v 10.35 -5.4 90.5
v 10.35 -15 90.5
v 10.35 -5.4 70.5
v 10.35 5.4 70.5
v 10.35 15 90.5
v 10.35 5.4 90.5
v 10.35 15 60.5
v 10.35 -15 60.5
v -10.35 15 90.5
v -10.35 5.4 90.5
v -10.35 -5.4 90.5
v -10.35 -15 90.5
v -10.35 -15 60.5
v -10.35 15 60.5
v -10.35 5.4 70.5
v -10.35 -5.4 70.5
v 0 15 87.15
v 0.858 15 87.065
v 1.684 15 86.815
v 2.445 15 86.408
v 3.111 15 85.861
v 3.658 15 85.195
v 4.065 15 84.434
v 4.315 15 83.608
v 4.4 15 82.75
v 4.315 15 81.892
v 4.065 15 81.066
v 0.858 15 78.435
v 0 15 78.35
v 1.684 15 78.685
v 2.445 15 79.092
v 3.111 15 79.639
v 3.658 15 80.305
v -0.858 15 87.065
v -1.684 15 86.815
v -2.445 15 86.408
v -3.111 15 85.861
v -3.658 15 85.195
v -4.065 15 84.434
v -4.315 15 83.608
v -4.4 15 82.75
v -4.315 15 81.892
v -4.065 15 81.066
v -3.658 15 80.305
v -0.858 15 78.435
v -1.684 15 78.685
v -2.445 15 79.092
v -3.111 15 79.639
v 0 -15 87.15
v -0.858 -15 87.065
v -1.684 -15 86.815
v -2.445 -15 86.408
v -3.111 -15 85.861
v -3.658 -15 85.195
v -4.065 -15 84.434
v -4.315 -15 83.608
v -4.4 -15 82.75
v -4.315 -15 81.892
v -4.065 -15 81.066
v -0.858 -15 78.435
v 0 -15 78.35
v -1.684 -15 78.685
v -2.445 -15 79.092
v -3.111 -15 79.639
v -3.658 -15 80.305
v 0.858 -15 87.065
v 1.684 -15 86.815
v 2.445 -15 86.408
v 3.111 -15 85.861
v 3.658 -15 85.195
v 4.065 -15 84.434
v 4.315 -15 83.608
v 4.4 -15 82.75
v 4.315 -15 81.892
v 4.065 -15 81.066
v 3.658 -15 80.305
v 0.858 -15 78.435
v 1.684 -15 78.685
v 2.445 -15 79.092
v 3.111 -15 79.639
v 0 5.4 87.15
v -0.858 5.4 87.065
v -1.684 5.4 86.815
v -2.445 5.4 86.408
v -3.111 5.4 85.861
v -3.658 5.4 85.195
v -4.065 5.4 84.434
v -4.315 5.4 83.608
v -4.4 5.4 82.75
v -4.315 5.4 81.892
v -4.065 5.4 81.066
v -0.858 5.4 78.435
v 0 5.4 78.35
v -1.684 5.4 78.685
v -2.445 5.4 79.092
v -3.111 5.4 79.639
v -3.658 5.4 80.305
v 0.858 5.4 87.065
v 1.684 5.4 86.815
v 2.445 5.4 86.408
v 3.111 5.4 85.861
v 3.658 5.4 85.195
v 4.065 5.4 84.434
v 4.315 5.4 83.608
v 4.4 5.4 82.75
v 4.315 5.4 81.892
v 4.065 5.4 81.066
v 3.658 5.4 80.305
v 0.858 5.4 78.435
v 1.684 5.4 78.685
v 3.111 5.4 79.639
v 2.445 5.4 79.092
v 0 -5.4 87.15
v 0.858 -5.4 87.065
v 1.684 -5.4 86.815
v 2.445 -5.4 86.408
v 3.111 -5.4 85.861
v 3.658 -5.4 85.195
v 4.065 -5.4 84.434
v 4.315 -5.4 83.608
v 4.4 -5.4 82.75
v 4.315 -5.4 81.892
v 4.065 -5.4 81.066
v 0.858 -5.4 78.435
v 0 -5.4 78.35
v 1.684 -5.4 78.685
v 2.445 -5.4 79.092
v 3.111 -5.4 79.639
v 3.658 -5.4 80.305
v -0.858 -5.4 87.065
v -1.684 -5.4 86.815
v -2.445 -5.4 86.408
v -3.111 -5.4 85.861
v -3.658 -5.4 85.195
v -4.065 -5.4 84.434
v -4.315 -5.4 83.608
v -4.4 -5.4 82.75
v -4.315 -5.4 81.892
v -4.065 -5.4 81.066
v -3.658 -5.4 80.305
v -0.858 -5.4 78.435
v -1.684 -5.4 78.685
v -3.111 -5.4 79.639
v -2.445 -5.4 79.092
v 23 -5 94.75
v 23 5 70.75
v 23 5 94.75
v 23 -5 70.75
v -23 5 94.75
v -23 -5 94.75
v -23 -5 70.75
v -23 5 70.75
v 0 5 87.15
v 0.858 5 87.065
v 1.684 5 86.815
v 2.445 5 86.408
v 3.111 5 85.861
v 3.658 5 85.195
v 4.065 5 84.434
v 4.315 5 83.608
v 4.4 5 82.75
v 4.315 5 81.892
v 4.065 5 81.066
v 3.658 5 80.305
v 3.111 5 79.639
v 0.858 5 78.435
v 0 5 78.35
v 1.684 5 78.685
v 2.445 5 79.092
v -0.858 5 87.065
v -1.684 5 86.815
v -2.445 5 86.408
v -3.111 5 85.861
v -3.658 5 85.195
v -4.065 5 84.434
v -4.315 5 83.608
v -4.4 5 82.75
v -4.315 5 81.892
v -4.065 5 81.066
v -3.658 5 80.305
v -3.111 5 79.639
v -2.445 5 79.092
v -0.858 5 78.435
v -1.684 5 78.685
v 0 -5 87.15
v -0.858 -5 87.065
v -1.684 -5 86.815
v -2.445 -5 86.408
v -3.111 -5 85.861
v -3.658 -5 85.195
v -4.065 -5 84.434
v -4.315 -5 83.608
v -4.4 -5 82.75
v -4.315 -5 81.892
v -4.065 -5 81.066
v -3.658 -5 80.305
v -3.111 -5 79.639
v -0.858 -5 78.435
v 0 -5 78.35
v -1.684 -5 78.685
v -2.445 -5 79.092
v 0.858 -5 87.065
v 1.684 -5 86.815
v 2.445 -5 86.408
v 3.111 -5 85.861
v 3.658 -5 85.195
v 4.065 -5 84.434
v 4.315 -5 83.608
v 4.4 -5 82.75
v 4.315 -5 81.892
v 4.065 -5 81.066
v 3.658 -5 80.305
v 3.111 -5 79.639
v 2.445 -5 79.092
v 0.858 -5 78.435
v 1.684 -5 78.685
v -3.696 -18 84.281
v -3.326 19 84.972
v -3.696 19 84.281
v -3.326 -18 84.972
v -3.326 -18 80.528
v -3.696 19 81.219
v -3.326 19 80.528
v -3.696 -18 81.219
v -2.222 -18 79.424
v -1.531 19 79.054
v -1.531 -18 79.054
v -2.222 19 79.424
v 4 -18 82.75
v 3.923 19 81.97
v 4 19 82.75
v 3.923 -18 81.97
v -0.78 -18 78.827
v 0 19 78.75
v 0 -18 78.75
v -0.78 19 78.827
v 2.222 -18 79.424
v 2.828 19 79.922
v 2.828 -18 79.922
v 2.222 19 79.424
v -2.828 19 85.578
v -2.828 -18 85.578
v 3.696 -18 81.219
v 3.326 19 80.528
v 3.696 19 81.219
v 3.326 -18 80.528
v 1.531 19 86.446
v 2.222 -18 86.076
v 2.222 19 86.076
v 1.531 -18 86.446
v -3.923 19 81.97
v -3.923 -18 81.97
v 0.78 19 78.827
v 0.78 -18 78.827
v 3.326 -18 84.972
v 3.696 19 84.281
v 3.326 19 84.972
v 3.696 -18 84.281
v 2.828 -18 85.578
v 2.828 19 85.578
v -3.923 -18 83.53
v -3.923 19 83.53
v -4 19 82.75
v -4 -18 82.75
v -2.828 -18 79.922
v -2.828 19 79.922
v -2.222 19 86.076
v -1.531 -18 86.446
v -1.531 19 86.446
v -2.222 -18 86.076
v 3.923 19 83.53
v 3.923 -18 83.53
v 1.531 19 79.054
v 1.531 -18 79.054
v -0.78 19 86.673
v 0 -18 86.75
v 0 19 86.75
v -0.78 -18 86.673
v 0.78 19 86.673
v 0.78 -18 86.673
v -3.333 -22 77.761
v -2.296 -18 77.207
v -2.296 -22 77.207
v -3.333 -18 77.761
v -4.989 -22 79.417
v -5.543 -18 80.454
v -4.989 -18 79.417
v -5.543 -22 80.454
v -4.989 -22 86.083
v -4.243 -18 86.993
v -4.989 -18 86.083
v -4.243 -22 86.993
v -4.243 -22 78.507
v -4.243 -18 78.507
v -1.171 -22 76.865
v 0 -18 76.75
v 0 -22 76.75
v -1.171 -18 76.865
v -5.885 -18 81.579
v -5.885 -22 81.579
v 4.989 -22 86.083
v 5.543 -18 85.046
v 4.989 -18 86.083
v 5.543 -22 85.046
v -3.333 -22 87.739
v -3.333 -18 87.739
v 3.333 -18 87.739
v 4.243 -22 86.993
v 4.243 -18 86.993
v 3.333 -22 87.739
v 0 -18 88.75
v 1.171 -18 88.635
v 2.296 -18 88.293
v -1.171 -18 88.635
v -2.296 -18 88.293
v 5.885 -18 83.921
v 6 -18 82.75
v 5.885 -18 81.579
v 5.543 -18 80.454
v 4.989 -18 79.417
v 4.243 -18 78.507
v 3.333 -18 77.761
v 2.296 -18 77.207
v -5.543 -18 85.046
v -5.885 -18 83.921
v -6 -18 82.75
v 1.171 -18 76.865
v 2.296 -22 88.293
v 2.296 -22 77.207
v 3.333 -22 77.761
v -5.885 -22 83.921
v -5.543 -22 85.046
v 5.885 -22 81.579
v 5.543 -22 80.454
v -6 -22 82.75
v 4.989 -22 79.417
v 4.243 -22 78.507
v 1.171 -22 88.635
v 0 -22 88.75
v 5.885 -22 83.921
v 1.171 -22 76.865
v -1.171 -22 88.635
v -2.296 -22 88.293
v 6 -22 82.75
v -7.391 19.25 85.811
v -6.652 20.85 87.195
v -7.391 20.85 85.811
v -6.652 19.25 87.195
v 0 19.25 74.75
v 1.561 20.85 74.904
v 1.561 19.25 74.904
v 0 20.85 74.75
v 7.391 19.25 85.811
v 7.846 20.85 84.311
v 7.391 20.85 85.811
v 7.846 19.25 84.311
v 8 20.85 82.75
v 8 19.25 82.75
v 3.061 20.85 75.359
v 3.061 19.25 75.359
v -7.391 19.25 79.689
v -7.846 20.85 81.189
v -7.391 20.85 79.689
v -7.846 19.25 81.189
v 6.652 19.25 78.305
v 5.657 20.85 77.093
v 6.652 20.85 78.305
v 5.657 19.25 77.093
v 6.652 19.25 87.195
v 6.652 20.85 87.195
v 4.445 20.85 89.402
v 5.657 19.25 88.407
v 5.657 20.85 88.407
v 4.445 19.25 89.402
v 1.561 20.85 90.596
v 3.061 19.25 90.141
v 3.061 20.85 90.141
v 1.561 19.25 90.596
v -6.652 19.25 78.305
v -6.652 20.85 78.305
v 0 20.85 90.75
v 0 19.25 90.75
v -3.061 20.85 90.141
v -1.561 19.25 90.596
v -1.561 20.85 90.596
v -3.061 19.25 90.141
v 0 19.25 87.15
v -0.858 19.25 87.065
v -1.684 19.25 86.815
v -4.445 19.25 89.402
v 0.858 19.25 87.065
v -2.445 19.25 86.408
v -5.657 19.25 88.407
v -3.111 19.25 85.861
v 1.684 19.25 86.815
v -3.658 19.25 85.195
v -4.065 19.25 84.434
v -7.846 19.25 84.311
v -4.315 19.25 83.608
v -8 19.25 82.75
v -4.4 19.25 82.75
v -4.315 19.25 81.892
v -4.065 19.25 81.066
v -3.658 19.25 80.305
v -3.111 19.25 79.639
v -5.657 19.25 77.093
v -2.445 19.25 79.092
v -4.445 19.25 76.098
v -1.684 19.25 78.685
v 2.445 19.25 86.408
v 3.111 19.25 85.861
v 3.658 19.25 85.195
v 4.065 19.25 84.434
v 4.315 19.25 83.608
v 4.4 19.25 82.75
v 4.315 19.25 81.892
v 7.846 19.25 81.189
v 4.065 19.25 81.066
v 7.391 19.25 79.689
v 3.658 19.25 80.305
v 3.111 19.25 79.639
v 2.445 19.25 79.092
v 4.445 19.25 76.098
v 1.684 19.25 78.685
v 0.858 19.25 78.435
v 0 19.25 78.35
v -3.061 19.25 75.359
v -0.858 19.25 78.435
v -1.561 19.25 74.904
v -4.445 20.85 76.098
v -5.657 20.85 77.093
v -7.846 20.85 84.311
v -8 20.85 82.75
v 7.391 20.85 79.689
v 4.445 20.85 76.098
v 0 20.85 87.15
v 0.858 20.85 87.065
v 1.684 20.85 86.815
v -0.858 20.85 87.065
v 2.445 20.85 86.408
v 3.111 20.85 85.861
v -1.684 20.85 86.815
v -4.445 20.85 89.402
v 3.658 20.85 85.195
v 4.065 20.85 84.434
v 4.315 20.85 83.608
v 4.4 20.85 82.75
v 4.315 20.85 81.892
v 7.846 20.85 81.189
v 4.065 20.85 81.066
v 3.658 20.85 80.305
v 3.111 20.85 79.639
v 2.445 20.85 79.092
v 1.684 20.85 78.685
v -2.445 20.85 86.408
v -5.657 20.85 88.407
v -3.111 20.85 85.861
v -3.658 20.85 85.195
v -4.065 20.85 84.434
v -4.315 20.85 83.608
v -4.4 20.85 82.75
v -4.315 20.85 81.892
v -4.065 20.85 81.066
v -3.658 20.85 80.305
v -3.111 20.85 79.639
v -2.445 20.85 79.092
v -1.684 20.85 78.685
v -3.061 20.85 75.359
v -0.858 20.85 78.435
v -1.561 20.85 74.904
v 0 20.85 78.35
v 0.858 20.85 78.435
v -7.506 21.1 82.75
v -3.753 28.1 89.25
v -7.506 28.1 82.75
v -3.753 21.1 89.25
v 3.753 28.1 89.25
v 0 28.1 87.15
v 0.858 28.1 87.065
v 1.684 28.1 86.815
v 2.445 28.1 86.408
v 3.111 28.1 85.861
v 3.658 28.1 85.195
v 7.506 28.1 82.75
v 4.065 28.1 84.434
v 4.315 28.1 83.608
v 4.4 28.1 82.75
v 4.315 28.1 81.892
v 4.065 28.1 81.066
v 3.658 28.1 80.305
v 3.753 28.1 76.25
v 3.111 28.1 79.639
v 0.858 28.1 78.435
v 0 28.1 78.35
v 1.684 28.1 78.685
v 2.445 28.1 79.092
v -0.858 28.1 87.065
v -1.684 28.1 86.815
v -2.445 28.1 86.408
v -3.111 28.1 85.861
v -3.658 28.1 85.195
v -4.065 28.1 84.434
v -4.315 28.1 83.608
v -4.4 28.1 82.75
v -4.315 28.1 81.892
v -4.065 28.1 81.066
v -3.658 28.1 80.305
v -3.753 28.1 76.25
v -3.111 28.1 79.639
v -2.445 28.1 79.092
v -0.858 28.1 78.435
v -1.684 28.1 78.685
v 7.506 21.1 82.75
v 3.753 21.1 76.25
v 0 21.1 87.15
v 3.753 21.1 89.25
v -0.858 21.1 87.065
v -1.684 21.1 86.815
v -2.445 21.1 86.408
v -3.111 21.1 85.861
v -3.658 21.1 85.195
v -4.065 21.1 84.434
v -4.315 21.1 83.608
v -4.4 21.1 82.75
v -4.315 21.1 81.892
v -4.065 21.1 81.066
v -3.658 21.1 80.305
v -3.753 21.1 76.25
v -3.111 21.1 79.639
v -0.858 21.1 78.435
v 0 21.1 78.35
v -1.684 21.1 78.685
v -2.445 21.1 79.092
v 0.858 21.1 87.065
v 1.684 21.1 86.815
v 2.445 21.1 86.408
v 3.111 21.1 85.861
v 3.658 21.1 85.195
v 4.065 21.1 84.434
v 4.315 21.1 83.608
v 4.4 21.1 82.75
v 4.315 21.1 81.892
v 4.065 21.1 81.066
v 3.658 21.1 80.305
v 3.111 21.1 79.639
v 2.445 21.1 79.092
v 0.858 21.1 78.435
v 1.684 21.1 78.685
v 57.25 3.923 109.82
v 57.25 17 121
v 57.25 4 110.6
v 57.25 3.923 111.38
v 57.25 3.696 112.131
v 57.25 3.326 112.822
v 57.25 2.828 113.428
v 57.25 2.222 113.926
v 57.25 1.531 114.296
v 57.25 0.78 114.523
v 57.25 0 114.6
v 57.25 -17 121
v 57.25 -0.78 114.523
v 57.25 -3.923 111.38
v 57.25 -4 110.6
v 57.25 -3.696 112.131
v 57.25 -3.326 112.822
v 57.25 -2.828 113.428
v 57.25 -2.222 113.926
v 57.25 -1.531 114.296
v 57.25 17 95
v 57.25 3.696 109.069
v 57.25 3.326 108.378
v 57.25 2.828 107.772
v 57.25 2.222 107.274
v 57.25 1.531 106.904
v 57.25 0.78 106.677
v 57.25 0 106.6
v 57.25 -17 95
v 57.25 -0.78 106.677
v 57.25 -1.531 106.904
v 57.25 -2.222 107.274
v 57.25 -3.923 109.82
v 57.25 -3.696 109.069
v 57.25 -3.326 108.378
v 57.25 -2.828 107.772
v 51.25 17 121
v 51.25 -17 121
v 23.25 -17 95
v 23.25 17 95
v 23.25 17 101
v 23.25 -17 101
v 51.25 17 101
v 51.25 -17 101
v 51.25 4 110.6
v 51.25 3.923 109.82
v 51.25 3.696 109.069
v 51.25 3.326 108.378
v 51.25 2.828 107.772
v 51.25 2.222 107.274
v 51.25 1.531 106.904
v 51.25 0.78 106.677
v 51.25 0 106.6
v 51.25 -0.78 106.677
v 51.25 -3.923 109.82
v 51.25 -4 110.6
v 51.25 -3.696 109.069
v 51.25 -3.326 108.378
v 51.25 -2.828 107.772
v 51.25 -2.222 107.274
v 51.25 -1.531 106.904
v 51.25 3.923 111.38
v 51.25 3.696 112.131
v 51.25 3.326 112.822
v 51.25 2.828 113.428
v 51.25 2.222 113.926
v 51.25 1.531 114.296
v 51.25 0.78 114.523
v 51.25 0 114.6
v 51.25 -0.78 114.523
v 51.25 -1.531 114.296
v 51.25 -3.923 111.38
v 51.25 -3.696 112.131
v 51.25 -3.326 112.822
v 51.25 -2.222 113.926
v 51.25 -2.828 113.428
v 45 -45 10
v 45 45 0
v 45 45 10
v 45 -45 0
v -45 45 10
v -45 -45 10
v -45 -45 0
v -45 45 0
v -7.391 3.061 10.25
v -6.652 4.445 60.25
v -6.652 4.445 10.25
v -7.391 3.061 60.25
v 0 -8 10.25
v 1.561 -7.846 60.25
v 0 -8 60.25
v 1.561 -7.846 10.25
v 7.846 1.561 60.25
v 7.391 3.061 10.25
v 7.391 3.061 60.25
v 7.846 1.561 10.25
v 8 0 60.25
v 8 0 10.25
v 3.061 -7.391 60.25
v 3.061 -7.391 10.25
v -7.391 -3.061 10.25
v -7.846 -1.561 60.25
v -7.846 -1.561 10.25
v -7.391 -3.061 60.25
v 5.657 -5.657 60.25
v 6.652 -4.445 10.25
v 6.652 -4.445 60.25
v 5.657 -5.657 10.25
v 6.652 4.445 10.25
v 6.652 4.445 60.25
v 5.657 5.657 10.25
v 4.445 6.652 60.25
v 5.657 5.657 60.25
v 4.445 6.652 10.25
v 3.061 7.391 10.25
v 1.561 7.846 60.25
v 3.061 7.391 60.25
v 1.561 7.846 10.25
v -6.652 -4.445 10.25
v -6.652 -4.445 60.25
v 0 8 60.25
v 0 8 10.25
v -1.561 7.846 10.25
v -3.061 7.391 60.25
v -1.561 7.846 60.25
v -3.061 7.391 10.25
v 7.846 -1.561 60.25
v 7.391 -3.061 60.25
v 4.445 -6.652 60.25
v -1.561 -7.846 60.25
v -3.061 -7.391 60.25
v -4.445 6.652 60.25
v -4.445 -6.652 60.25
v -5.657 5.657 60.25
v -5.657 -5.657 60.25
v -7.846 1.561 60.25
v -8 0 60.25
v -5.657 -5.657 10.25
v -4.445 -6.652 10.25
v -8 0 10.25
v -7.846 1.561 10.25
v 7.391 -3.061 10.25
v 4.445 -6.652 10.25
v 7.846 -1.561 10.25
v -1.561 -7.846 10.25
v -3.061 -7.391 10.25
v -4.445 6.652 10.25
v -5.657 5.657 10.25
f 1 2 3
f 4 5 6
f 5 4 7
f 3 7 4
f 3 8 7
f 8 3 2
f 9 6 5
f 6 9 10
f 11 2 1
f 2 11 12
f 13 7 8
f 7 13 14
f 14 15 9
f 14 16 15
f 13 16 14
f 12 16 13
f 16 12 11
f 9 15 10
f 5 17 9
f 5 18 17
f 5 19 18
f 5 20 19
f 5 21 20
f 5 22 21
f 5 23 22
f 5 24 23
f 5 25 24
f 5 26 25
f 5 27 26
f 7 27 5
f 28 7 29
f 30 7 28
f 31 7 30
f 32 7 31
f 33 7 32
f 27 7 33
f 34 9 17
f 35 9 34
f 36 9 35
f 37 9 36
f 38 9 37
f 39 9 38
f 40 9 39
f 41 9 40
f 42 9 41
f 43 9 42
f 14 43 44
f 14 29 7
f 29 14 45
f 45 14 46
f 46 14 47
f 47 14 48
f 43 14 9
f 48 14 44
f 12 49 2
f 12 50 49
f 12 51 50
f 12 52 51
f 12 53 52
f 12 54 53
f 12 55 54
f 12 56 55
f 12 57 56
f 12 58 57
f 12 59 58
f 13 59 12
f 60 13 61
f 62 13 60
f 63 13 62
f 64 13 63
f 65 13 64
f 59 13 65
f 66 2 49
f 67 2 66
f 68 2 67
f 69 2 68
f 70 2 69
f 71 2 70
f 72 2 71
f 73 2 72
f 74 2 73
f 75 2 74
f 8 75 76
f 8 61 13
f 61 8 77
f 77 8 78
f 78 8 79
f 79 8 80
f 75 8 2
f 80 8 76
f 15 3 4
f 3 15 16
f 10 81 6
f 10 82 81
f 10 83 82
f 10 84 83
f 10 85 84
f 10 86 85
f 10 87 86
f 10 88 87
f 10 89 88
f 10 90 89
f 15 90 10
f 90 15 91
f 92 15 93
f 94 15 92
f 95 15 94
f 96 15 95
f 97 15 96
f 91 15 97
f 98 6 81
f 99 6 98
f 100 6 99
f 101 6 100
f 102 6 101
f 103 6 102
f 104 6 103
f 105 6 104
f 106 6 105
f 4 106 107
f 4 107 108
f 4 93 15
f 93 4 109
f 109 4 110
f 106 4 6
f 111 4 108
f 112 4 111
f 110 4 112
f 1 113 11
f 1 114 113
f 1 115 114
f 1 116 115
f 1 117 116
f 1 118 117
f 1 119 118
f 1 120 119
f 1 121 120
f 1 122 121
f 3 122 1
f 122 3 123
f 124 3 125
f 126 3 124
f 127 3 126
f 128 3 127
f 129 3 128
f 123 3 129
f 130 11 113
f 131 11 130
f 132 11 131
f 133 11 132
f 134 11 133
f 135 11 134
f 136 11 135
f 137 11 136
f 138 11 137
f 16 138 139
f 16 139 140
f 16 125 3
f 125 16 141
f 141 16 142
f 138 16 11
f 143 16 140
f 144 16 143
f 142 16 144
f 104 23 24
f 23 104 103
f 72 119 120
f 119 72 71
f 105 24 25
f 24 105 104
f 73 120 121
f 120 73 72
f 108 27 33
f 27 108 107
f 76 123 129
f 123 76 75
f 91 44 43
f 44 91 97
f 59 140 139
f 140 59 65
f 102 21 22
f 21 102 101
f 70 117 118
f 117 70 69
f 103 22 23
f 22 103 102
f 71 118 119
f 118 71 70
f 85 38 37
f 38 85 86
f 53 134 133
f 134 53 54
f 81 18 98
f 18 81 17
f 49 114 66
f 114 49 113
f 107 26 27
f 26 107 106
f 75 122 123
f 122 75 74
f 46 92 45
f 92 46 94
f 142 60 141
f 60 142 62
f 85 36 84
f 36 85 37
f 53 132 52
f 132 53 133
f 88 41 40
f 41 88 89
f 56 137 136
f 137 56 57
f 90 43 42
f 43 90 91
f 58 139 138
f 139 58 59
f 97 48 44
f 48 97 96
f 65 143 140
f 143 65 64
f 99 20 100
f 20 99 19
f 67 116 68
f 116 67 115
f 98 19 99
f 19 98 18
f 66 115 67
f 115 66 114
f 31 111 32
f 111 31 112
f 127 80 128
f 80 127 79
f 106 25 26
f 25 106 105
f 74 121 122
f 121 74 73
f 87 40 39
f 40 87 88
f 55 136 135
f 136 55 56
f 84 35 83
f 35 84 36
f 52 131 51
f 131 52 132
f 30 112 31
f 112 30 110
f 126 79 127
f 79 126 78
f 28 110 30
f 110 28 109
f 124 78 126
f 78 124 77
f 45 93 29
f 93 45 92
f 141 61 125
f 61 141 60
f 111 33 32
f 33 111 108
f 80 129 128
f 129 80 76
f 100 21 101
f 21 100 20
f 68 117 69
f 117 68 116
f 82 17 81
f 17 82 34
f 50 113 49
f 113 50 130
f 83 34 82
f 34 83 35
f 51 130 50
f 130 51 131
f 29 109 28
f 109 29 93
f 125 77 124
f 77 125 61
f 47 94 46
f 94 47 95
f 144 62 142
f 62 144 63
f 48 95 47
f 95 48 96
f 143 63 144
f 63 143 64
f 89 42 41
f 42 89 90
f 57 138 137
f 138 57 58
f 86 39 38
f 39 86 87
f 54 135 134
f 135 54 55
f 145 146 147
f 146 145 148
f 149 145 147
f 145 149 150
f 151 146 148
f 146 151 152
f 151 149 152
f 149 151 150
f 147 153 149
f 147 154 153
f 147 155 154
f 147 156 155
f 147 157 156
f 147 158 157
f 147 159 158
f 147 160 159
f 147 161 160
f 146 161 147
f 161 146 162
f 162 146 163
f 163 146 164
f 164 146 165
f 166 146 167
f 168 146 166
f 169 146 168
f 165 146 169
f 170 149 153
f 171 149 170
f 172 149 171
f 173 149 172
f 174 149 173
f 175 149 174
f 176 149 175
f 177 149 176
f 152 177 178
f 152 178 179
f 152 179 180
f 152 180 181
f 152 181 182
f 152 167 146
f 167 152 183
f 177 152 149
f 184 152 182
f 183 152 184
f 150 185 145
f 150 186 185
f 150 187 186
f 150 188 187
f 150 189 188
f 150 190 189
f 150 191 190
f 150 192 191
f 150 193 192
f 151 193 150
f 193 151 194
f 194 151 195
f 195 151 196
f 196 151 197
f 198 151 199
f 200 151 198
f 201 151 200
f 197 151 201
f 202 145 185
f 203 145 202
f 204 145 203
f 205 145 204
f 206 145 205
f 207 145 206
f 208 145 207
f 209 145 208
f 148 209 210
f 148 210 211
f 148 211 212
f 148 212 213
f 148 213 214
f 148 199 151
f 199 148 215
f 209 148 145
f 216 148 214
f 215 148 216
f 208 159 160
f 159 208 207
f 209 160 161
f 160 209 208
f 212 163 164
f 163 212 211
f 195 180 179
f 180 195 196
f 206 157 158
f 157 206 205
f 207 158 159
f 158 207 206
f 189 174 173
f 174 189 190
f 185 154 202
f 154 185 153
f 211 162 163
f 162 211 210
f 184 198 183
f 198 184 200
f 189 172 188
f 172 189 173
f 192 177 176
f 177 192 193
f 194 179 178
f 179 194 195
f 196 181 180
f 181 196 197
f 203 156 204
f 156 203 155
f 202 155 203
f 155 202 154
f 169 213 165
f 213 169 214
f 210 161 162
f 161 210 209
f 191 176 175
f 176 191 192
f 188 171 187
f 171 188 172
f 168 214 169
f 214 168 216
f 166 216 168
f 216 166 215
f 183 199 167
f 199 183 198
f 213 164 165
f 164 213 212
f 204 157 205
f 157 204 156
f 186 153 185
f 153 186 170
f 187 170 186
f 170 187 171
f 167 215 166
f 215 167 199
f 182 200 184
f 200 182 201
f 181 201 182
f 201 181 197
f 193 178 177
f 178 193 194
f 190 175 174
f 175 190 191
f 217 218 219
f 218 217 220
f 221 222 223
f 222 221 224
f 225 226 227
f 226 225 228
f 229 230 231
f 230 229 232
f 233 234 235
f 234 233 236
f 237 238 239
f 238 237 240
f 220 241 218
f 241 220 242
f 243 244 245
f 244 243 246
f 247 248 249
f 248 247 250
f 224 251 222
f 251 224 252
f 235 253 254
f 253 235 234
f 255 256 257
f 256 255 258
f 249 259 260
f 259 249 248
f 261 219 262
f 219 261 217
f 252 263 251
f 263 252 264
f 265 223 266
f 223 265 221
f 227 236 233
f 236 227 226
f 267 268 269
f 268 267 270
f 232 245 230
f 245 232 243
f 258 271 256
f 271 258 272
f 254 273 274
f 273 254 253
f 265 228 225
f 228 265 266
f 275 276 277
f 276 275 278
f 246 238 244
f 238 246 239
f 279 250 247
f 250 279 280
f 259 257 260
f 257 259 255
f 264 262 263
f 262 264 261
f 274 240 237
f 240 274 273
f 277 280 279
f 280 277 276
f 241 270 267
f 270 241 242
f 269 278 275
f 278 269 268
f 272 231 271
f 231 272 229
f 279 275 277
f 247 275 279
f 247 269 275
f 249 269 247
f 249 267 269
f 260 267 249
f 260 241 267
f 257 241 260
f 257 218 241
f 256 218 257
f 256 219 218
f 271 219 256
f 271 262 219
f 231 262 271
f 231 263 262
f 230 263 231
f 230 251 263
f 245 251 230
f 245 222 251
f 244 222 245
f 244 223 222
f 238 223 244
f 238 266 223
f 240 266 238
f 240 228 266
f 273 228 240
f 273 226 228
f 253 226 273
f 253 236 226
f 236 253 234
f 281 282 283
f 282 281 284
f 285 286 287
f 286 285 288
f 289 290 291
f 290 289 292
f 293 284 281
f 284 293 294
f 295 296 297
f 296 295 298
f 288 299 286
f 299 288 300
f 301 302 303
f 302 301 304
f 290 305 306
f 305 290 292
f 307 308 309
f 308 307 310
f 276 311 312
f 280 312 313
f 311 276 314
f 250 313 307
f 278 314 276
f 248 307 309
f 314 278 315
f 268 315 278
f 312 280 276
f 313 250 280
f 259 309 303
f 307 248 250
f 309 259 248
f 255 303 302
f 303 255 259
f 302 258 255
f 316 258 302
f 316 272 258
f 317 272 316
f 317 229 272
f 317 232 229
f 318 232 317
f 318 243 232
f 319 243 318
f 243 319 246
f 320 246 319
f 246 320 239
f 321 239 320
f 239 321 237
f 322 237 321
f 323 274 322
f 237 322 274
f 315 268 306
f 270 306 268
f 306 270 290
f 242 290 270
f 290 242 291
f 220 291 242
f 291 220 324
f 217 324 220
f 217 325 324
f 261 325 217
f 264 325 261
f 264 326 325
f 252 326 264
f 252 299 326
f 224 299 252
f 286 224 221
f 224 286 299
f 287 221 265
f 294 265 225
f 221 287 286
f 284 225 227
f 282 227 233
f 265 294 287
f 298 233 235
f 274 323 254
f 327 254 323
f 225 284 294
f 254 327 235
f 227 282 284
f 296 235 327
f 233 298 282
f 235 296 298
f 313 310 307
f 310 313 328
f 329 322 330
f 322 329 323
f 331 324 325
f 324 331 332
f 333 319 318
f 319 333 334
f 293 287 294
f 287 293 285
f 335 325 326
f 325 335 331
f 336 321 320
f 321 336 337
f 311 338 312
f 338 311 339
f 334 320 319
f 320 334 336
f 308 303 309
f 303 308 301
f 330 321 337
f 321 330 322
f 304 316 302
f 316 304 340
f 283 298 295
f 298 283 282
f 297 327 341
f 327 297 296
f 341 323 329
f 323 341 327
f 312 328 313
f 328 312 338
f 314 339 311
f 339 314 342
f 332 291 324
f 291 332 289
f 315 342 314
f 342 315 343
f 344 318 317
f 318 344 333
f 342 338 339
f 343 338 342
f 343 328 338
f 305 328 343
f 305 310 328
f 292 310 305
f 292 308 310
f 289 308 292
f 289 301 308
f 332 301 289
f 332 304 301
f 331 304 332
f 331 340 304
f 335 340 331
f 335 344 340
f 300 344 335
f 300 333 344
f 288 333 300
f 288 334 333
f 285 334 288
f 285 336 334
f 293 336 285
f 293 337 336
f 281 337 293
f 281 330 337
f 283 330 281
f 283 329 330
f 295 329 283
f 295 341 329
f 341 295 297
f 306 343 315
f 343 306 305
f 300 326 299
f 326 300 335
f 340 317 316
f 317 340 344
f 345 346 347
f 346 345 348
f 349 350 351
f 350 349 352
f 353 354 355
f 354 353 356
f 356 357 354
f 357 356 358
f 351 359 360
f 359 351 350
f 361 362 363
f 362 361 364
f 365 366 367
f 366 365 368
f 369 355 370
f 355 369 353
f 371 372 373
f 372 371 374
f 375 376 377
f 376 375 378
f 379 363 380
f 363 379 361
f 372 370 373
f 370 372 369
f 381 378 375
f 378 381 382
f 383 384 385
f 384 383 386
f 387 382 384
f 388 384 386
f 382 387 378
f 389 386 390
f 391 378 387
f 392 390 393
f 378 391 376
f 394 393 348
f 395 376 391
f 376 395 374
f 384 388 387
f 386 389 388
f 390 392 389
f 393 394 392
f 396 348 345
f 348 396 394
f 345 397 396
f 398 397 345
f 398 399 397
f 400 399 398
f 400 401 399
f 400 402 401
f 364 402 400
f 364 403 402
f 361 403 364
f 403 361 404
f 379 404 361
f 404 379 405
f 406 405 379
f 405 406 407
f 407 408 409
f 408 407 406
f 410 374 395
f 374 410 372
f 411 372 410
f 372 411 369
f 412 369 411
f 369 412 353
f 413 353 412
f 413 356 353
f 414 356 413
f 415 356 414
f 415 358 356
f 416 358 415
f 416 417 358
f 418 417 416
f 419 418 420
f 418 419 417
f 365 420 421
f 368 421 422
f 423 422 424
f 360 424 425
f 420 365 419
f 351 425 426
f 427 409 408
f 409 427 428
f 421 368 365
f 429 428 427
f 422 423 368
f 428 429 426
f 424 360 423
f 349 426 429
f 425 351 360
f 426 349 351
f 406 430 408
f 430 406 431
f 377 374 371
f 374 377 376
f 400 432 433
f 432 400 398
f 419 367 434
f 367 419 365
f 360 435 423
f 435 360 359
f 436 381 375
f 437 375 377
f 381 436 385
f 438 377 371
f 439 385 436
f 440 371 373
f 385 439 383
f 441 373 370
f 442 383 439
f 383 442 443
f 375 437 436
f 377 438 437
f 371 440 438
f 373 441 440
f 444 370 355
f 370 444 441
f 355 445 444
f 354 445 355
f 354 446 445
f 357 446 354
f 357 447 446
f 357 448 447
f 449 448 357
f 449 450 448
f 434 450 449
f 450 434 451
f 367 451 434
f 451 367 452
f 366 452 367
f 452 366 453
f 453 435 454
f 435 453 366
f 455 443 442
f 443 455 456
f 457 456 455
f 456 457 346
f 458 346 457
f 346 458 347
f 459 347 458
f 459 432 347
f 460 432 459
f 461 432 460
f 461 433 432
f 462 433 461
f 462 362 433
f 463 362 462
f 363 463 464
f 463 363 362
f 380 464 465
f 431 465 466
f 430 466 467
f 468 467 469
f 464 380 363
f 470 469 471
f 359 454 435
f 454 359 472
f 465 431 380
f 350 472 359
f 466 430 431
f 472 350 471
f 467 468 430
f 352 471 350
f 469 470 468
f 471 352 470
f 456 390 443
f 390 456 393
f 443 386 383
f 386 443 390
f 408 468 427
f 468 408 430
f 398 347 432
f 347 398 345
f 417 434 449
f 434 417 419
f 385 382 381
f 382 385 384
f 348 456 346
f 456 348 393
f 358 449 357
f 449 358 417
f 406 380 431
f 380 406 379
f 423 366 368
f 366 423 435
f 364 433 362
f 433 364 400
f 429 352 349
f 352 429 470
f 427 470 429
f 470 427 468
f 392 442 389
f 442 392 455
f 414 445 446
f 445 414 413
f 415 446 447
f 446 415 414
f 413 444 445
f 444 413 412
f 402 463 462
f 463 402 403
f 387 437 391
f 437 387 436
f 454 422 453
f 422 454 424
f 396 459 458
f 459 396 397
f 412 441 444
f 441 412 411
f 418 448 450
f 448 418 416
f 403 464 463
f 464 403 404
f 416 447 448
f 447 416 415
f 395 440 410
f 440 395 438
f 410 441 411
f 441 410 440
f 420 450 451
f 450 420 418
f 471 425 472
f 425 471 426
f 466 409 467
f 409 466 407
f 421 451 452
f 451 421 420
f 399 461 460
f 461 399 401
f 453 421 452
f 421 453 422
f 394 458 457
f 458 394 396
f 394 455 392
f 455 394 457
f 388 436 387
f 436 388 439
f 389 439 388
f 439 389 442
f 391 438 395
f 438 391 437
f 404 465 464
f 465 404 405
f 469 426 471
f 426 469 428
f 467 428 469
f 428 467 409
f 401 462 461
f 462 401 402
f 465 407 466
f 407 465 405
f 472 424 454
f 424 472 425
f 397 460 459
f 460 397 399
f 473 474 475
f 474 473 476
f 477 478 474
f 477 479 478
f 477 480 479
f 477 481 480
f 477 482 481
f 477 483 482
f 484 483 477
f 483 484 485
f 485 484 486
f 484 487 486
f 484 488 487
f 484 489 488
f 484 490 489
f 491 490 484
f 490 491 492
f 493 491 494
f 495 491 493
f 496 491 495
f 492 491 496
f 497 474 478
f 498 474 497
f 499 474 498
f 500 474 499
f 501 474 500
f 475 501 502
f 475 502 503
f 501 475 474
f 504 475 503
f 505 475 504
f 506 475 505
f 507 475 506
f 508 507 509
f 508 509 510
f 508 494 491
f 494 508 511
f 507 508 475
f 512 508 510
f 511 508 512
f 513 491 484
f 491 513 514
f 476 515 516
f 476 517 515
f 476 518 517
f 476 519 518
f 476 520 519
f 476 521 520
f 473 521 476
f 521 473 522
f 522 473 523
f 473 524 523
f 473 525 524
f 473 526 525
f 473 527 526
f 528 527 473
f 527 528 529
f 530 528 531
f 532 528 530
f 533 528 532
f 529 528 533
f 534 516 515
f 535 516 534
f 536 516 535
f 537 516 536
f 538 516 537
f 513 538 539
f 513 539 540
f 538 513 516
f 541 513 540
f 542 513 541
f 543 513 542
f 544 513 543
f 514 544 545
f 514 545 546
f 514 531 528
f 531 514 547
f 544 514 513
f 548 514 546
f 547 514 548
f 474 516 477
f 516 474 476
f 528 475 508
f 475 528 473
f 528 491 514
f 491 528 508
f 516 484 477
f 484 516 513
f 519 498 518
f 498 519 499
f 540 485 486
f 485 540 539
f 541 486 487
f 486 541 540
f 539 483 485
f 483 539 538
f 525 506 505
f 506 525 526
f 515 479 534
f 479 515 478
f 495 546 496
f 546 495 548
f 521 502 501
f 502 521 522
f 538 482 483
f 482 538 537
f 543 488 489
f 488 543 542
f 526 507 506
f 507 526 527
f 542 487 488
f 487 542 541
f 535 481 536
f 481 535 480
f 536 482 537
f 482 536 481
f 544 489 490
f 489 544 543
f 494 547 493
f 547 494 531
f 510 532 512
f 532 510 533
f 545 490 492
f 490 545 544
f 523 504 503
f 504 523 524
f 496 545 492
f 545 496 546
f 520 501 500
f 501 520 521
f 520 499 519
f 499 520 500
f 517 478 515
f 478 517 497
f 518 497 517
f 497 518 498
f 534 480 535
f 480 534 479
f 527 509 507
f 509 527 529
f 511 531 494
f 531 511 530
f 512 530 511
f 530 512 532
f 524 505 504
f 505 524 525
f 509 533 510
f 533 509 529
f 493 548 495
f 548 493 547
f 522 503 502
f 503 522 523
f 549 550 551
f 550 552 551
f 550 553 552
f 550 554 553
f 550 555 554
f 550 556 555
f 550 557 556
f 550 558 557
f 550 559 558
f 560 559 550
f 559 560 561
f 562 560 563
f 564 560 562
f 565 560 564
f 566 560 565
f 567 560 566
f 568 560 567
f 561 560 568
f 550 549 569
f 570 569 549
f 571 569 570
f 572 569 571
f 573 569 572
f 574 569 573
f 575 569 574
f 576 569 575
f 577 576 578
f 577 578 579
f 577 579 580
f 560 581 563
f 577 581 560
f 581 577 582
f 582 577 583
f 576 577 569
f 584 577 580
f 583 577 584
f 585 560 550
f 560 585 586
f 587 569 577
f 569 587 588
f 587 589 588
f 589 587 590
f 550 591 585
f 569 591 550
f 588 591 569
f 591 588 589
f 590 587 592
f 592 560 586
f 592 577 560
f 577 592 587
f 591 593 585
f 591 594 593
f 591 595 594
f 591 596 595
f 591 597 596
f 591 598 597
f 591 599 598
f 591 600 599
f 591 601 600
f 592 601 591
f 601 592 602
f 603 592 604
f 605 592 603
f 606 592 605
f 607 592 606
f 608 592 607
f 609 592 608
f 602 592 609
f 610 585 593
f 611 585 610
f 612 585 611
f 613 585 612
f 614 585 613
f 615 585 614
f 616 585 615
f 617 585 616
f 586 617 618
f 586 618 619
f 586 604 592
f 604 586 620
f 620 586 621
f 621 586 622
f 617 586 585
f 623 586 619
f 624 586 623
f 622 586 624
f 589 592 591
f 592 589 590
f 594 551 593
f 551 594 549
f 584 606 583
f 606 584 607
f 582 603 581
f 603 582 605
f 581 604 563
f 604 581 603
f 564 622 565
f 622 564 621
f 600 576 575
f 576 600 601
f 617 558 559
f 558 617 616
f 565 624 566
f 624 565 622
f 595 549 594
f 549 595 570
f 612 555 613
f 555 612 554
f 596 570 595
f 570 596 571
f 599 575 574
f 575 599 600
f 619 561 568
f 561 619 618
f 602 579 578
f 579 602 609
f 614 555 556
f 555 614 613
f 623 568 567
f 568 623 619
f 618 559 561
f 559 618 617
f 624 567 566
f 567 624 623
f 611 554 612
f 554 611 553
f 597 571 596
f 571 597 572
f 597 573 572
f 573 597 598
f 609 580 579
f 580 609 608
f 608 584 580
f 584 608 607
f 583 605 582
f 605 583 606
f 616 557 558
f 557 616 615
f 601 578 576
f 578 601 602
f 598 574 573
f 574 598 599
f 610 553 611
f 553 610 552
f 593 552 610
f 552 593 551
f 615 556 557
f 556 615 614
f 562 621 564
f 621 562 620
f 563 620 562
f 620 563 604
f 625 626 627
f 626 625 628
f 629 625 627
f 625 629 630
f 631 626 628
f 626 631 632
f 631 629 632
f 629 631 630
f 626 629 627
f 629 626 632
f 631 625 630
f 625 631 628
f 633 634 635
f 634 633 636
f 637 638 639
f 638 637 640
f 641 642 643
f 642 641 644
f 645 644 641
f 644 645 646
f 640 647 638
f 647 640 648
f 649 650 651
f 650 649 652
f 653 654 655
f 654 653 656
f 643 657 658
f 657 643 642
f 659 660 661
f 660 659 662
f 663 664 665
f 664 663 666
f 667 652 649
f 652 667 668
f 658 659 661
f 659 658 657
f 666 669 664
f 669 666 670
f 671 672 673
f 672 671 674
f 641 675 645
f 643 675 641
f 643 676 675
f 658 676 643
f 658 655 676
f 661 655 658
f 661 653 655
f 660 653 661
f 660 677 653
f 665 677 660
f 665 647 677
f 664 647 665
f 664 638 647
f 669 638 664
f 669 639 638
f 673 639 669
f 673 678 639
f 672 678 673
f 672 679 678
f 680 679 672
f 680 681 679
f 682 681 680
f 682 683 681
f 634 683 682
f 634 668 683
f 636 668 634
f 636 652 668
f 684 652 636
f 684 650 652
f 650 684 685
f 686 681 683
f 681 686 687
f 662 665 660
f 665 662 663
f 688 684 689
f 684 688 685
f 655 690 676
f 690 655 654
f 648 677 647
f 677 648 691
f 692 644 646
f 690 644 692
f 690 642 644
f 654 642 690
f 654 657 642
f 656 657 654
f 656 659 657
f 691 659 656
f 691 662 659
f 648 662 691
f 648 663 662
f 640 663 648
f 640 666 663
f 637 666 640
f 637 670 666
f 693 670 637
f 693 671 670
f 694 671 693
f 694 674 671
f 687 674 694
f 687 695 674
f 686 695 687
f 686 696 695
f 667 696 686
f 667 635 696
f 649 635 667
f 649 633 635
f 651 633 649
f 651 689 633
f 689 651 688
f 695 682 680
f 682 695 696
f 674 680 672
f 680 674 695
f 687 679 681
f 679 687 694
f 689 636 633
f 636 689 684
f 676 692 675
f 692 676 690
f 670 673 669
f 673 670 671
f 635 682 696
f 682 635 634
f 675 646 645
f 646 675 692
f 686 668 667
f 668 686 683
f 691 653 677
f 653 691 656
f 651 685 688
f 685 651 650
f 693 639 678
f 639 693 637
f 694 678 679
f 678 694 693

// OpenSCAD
$fn = 32;

// ------------------------------------------------------------------------
// Lamp arm: column d16 x 50 mm, arm 46 mm
// Every part is its own module, assembly() places every instance.
// ------------------------------------------------------------------------

// --- part 1 ---
module lamp_base() {
  difference() {
    translate([-45, -45, 0]) cube([90, 90, 10]);
  }
}

// --- part 2 ---
module lamp_column() {
  cylinder(h = 50, d = 16);
}

// --- part 3 ---
module head_fork() {
  difference() {
    translate([-10.35, -15, 0]) cube([20.7, 30, 30]);
    translate([-11.35, -5.4, 10]) cube([22.7, 10.8, 21]);
    translate([0, 0, 22.25]) rotate([90, 0, 0]) cylinder(h = 32, d = 8.8, center = true);
  }
}

// --- part 4 ---
module lamp_arm() {
  difference() {
    translate([-23, -5, 0]) cube([46, 10, 24]);
    translate([0, 0, 12]) rotate([90, 0, 0]) cylinder(h = 12, d = 8.8, center = true);
  }
}

// --- part 5 ---
module arm_pin() {
  rotate([0, 90, 0]) cylinder(h = 38, d = 8, center = true);
  translate([-22, 0, 0]) rotate([0, 90, 0]) cylinder(h = 4, d = 12);
}

// --- part 6 ---
module arm_washer() {
  difference() {
      translate([0, 0, 0]) cylinder(h = 1.6, d = 16);
      translate([0, 0, -1]) cylinder(h = 3.6, d = 8.8);
    }
}

// --- part 7 ---
module arm_nut() {
  difference() {
    linear_extrude(height = 7) polygon(points = [[7.506, 0], [3.753, 6.5], [-3.753, 6.5], [-7.506, 0], [-3.753, -6.5], [3.753, -6.5]]);
    translate([0, 0, -1]) cylinder(h = 9, d = 8.8);
  }
}

// --- part 8 ---
module shade_bracket() {
  difference() {
    translate([-17, -17, 0]) cube([34, 34, 26]);
    translate([-18, -18, 6]) cube([29, 36, 21]);
    translate([14, 0, 15.6]) rotate([0, 90, 0]) cylinder(h = 8, d = 8, center = true);
  }
}

// --- assembly ---
module assembly() {
  color([0.80, 0.24, 0.20]) translate([0, 0, 0]) rotate([0, 0, 0]) lamp_base();
  color([0.20, 0.45, 0.75]) translate([0, 0, 10.25]) rotate([0, 0, 0]) lamp_column();
  color([0.25, 0.62, 0.32]) translate([0, 0, 60.5]) rotate([0, 0, 0]) head_fork();
  color([0.92, 0.70, 0.18]) translate([0, 0, 70.75]) rotate([0, 0, 0]) lamp_arm();
  color([0.58, 0.35, 0.70]) translate([0, 0, 82.75]) rotate([0, 0, 90]) arm_pin();
  color([0.16, 0.66, 0.66]) translate([0, 20.85, 82.75]) rotate([90, 0, 0]) arm_washer();
  color([0.85, 0.48, 0.18]) translate([0, 28.1, 82.75]) rotate([90, 0, 0]) arm_nut();
  color([0.55, 0.60, 0.65]) translate([40.25, 0, 95]) rotate([0, 0, 0]) shade_bracket();
}

assembly();
